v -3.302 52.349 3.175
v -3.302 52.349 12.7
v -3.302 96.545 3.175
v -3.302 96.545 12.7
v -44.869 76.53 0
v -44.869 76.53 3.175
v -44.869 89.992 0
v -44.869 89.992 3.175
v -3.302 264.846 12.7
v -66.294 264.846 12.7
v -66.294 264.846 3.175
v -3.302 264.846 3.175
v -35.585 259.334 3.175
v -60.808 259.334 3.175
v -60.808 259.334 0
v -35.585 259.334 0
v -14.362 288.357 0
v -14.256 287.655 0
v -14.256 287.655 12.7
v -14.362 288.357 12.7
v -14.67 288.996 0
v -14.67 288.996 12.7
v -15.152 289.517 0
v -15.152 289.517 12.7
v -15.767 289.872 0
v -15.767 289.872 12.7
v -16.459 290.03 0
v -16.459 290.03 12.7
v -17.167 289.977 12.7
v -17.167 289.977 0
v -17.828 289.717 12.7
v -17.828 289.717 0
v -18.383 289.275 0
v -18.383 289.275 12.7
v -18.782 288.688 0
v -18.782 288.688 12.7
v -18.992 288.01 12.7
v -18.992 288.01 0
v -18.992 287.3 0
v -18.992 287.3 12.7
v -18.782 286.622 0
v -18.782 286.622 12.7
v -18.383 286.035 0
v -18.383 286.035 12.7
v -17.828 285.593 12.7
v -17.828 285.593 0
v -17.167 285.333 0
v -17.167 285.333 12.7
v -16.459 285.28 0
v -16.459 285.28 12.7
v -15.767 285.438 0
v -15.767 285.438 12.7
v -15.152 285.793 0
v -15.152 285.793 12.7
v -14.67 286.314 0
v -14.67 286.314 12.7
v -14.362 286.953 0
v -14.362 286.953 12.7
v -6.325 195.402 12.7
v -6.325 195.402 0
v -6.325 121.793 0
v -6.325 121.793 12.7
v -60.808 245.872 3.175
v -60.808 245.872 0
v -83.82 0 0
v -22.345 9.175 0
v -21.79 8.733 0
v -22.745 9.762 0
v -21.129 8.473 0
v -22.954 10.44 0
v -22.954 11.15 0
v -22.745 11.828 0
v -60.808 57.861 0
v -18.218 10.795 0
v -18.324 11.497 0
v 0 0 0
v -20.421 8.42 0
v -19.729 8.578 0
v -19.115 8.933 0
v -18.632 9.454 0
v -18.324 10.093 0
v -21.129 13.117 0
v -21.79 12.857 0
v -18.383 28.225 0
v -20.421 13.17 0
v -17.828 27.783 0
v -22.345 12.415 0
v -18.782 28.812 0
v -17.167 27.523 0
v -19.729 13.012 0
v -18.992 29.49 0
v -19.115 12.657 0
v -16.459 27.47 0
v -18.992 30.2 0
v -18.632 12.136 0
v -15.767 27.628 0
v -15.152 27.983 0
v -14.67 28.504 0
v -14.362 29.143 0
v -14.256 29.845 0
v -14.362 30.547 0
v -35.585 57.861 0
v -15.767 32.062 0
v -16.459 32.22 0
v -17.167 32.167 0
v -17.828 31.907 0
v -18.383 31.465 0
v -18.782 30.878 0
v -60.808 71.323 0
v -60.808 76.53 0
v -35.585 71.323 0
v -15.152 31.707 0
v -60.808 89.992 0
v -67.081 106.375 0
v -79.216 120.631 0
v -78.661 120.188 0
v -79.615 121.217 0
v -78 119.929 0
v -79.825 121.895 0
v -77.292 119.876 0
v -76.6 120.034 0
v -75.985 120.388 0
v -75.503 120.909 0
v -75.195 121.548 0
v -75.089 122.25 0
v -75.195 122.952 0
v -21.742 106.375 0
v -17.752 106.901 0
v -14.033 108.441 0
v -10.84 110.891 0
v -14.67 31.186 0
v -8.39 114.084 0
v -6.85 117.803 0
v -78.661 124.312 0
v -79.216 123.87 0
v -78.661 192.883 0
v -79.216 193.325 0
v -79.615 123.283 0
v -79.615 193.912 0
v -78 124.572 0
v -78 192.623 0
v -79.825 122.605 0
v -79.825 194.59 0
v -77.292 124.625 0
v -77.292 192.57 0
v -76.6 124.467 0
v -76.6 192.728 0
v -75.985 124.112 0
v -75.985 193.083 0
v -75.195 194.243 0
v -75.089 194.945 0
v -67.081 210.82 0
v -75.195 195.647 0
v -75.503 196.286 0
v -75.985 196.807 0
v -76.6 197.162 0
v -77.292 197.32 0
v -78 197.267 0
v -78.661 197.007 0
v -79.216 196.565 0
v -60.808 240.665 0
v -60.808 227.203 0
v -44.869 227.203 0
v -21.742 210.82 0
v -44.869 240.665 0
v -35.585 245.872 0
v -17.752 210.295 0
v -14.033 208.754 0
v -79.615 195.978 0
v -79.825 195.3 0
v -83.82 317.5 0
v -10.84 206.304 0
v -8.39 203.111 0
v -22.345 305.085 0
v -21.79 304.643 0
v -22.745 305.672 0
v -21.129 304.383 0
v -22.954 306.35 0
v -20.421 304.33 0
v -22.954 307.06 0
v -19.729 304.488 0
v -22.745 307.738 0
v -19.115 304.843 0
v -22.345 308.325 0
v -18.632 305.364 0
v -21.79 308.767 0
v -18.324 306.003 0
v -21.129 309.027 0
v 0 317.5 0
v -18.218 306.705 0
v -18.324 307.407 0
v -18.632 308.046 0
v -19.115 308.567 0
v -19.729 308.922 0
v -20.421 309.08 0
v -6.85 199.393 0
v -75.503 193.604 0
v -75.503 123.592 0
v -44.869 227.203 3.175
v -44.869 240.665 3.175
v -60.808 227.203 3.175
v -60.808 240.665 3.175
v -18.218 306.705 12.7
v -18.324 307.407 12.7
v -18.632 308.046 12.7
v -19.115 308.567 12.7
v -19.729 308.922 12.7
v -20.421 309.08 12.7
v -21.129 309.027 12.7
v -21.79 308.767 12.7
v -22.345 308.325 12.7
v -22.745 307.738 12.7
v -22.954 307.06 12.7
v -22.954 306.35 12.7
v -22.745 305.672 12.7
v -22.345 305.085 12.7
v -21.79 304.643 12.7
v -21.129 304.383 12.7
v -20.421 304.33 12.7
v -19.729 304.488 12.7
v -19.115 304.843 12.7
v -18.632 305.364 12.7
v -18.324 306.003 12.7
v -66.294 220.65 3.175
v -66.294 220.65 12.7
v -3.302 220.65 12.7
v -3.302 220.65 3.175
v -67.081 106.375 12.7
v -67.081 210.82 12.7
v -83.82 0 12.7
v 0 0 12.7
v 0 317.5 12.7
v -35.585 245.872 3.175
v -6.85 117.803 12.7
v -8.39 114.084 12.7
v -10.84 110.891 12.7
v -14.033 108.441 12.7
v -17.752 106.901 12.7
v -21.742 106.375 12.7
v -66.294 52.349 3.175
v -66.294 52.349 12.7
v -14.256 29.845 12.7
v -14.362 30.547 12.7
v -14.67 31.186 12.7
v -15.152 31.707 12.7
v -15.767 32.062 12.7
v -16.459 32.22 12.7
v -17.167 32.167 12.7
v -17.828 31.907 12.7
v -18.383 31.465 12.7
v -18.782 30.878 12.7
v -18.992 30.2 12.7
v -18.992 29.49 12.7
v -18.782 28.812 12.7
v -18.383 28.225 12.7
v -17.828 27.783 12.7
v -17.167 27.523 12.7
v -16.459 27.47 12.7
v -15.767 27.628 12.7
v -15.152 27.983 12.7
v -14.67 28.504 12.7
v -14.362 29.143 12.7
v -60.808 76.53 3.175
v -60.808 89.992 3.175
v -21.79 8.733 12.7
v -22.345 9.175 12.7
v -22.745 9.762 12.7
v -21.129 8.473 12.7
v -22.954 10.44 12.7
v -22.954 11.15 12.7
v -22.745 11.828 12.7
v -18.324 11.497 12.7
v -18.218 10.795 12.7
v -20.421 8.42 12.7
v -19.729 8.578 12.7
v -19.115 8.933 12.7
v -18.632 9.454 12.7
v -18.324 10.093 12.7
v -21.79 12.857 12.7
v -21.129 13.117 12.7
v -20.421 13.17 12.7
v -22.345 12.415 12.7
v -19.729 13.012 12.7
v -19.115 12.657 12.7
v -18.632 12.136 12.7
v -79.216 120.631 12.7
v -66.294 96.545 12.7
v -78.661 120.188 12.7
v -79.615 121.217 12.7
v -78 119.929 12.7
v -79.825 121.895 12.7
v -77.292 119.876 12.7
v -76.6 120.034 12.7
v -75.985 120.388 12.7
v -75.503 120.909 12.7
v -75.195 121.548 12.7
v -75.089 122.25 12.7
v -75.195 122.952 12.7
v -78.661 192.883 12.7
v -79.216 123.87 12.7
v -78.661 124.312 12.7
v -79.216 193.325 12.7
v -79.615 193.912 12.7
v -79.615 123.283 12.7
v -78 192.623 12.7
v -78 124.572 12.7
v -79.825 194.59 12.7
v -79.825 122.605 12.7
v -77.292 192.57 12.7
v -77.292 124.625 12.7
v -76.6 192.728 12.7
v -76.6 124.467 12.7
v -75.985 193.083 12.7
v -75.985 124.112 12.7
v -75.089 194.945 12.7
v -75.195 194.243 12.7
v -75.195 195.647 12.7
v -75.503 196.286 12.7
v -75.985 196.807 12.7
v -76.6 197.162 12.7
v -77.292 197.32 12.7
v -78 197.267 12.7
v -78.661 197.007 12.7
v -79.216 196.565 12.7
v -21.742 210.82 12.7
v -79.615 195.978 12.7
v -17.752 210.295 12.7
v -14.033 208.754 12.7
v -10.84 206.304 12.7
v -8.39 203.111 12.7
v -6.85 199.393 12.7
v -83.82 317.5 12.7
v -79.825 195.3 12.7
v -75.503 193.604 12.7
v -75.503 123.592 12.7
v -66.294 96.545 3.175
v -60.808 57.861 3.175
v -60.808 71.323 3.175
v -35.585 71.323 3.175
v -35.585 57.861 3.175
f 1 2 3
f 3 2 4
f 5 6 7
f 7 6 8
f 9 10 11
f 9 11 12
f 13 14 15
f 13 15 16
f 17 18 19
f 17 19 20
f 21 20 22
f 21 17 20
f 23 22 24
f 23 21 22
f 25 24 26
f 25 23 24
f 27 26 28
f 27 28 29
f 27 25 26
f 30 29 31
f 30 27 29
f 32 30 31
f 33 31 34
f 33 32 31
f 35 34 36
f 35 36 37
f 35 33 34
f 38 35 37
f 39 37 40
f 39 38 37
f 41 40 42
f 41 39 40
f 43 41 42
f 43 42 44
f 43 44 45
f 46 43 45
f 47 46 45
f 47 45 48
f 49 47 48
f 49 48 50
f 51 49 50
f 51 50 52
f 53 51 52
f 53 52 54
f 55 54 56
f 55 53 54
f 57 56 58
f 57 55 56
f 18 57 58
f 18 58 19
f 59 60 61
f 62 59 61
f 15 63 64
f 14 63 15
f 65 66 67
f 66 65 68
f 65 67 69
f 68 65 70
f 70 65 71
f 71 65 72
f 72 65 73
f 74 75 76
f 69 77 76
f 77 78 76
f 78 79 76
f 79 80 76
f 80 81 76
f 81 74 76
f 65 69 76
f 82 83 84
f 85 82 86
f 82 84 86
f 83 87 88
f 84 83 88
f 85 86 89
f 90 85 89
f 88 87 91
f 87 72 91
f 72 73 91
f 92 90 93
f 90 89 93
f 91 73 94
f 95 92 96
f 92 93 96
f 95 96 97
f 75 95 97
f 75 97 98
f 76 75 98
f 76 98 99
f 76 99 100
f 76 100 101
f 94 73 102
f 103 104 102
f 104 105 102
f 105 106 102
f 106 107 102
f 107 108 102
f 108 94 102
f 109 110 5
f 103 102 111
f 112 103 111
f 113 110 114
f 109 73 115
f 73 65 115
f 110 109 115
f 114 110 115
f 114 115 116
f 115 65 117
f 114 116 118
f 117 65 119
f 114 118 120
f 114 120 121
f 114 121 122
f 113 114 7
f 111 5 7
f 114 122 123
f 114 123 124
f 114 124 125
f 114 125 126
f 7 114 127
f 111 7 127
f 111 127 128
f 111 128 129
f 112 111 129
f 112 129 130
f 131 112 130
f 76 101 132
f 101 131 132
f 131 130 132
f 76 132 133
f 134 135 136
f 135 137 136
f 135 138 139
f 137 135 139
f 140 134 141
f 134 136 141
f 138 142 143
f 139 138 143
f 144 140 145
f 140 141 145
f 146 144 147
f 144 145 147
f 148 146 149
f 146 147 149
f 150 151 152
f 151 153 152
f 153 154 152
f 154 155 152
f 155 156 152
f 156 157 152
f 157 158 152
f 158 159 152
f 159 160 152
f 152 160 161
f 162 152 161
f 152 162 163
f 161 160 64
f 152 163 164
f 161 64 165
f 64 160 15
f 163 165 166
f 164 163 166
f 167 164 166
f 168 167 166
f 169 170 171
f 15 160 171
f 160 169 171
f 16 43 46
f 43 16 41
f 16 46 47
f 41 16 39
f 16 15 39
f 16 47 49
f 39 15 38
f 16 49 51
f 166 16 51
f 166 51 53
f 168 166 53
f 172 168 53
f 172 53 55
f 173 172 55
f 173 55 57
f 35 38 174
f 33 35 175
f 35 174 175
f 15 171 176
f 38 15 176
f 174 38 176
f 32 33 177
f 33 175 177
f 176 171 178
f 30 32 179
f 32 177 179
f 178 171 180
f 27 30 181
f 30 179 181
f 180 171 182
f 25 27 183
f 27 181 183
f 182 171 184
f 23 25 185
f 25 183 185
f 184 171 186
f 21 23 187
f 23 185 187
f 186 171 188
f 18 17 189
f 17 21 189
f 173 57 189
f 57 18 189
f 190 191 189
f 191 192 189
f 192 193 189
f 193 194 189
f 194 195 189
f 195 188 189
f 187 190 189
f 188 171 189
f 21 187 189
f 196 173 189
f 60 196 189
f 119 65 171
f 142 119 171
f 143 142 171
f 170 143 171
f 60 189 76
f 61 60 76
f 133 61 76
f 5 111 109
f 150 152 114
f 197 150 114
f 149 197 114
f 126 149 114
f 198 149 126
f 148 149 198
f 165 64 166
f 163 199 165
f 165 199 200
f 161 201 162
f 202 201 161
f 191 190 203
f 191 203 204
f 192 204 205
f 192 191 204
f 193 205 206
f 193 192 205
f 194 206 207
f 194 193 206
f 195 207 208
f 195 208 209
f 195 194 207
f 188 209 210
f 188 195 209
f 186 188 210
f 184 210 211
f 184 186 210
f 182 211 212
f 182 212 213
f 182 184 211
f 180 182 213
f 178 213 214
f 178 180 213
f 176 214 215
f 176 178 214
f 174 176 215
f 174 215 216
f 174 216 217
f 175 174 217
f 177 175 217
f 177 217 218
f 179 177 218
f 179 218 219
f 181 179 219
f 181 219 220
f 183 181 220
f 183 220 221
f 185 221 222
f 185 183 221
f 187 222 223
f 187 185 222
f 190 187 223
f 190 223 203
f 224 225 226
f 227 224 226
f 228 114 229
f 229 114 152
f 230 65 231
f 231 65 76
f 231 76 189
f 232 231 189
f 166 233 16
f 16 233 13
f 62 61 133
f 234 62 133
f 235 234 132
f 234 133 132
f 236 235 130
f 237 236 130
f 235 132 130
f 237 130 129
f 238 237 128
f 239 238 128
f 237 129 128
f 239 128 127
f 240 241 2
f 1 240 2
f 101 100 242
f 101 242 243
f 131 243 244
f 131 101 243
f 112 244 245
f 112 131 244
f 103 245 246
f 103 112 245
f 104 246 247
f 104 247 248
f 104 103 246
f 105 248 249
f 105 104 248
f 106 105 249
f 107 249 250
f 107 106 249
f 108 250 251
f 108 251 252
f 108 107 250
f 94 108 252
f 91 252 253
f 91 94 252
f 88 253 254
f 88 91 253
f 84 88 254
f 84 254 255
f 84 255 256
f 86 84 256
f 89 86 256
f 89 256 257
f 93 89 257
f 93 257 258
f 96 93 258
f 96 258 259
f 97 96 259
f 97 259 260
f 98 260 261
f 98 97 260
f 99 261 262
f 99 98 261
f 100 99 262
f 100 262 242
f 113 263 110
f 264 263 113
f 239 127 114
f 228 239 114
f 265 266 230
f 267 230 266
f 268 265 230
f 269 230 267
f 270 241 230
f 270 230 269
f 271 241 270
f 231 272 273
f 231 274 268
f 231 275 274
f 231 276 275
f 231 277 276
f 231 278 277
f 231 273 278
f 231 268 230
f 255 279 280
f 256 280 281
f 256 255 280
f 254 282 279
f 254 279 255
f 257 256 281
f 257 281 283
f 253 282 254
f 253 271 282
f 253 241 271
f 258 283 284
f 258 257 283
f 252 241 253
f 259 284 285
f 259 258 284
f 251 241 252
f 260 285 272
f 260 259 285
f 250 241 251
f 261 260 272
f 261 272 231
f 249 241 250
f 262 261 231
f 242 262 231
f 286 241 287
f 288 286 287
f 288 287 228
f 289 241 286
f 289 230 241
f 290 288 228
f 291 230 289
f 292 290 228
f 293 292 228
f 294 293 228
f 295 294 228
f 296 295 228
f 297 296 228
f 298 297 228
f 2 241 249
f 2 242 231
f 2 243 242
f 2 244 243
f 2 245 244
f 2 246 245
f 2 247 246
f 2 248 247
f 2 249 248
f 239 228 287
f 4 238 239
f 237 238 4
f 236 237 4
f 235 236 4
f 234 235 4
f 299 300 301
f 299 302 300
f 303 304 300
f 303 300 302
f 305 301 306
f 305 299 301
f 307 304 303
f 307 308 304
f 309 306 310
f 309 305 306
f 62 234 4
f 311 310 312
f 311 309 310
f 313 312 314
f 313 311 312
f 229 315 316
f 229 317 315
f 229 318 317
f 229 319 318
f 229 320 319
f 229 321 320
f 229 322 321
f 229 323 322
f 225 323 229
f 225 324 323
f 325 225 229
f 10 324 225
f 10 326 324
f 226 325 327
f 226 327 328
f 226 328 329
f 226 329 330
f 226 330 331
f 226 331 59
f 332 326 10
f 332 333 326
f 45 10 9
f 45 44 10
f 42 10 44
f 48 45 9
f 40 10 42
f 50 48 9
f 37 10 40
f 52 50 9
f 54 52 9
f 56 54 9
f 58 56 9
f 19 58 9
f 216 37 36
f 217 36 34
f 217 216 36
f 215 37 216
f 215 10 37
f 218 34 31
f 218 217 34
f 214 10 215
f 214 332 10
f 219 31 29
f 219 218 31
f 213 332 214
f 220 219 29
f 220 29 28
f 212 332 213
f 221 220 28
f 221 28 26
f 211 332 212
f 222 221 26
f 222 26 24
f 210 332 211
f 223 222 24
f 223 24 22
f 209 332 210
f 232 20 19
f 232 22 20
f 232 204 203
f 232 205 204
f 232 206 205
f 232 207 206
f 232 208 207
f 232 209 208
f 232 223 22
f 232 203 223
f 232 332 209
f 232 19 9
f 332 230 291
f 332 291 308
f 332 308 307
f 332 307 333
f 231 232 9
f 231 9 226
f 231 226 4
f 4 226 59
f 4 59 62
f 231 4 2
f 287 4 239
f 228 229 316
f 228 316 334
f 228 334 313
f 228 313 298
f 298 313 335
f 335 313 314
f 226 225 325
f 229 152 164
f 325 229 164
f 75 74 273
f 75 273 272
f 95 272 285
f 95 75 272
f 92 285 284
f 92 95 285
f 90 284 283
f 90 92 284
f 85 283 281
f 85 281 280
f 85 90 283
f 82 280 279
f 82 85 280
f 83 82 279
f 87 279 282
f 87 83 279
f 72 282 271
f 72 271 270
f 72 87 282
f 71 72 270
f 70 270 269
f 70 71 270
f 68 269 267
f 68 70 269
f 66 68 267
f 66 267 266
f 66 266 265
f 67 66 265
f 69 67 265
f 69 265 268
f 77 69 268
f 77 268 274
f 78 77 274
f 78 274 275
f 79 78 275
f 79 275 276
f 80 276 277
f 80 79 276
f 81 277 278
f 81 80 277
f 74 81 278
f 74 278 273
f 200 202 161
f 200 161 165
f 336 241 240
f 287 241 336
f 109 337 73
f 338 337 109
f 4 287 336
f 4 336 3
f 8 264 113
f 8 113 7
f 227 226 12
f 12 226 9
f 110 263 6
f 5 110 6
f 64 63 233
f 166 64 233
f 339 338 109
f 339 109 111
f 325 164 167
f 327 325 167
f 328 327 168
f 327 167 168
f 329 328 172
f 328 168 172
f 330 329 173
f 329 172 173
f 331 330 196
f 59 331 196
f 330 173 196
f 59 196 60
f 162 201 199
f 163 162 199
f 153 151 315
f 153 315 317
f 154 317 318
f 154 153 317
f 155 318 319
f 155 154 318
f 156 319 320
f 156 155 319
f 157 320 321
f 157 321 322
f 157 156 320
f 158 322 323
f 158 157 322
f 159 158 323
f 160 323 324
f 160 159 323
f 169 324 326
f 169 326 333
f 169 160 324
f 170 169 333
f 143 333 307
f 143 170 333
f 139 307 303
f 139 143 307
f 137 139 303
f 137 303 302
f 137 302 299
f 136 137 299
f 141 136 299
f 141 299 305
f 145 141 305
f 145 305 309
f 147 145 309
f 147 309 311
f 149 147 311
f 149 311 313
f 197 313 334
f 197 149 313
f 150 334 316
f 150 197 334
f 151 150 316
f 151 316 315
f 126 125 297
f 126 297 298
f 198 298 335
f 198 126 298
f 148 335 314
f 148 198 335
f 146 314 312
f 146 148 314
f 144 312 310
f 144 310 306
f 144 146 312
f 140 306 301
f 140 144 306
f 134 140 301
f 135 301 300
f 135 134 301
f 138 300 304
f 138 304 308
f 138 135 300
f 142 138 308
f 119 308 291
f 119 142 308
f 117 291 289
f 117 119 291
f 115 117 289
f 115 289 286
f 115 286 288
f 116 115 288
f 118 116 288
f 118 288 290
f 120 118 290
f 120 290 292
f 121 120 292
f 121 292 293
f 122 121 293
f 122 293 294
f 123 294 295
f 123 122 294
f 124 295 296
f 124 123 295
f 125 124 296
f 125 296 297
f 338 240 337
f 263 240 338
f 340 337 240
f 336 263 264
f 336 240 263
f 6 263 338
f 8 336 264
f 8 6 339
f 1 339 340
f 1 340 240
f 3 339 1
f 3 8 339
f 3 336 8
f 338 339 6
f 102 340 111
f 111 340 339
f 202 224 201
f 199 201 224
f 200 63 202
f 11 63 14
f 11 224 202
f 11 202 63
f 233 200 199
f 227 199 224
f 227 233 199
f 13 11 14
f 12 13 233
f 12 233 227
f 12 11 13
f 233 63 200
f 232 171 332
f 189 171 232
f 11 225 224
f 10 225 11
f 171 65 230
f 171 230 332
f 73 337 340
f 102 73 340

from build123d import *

# Parameters (mm, degrees)
F0_W     = 83.82
F0_H     = 317.5
F0_R     = 2.38125
F1_DEPTH = 12.7
F2_W     = 62.992
F2_H     = 44.196
F3_DEPTH = 9.525
F4_W     = 15.9385
F4_H     = 13.462
F4_W_2   = 25.2222
F5_DEPTH = 3.176


with BuildPart() as f1:
    # F0 (on Top) → F1 (new body)
    with BuildSketch(Plane.XY):
        with Locations((-41.91, 158.75)):
            Rectangle(F0_W, F0_H)
        with Locations((-77.47, 122.2502)):
            Circle(F0_R, mode=Mode.SUBTRACT)
        with Locations((-20.5994, 10.795)):
            Circle(F0_R, mode=Mode.SUBTRACT)
        with Locations((-16.637, 29.845)):
            Circle(F0_R, mode=Mode.SUBTRACT)
        with BuildLine():
            ThreePointArc((-6.3246, 121.793), (-10.840369, 110.890969), (-21.7424, 106.3752))
            Line((-21.7424, 106.3752), (-36.2458, 106.3752))
            Line((-36.2458, 106.3752), (-67.0814, 106.3752))
            Line((-67.0814, 106.3752), (-67.0814, 137.2108))
            Line((-67.0814, 137.2108), (-67.0814, 179.9844))
            Line((-67.0814, 179.9844), (-67.0814, 210.82))
            Line((-67.0814, 210.82), (-36.2458, 210.82))
            Line((-36.2458, 210.82), (-21.7424, 210.82))
            ThreePointArc((-21.7424, 210.82), (-10.840369, 206.304231), (-6.3246, 195.4022))
            Line((-6.3246, 195.4022), (-6.3246, 121.793))
        make_face(mode=Mode.SUBTRACT)
        with Locations((-77.47, 194.945)):
            Circle(F0_R, mode=Mode.SUBTRACT)
        with Locations((-16.637, 287.655)):
            Circle(F0_R, mode=Mode.SUBTRACT)
        with Locations((-20.5994, 306.705)):
            Circle(F0_R, mode=Mode.SUBTRACT)
    extrude(amount=F1_DEPTH)

    # F2 (on face) → F3 (cut)
    with BuildSketch(Plane.XY.offset(12.7)):
        with Locations((-34.798, 74.4474)):
            Rectangle(F2_W, F2_H)
        with Locations((-34.798, 242.7478)):
            Rectangle(F2_W, F2_H)
    extrude(amount=-F3_DEPTH, mode=Mode.SUBTRACT)

    # F4 (on face) → F5 (cut, through all)
    with BuildSketch(Plane.XY.offset(3.175)):
        with Locations((-52.83835, 233.934)):
            Rectangle(F4_W, F4_H)
        with Locations((-48.1965, 252.603)):
            Rectangle(F4_W_2, F4_H)
        with Locations((-52.83835, 83.2612)):
            Rectangle(F4_W, F4_H)
        with Locations((-48.1965, 64.5922)):
            Rectangle(F4_W_2, F4_H)
    extrude(amount=-F5_DEPTH, mode=Mode.SUBTRACT)


solid = f1.part
